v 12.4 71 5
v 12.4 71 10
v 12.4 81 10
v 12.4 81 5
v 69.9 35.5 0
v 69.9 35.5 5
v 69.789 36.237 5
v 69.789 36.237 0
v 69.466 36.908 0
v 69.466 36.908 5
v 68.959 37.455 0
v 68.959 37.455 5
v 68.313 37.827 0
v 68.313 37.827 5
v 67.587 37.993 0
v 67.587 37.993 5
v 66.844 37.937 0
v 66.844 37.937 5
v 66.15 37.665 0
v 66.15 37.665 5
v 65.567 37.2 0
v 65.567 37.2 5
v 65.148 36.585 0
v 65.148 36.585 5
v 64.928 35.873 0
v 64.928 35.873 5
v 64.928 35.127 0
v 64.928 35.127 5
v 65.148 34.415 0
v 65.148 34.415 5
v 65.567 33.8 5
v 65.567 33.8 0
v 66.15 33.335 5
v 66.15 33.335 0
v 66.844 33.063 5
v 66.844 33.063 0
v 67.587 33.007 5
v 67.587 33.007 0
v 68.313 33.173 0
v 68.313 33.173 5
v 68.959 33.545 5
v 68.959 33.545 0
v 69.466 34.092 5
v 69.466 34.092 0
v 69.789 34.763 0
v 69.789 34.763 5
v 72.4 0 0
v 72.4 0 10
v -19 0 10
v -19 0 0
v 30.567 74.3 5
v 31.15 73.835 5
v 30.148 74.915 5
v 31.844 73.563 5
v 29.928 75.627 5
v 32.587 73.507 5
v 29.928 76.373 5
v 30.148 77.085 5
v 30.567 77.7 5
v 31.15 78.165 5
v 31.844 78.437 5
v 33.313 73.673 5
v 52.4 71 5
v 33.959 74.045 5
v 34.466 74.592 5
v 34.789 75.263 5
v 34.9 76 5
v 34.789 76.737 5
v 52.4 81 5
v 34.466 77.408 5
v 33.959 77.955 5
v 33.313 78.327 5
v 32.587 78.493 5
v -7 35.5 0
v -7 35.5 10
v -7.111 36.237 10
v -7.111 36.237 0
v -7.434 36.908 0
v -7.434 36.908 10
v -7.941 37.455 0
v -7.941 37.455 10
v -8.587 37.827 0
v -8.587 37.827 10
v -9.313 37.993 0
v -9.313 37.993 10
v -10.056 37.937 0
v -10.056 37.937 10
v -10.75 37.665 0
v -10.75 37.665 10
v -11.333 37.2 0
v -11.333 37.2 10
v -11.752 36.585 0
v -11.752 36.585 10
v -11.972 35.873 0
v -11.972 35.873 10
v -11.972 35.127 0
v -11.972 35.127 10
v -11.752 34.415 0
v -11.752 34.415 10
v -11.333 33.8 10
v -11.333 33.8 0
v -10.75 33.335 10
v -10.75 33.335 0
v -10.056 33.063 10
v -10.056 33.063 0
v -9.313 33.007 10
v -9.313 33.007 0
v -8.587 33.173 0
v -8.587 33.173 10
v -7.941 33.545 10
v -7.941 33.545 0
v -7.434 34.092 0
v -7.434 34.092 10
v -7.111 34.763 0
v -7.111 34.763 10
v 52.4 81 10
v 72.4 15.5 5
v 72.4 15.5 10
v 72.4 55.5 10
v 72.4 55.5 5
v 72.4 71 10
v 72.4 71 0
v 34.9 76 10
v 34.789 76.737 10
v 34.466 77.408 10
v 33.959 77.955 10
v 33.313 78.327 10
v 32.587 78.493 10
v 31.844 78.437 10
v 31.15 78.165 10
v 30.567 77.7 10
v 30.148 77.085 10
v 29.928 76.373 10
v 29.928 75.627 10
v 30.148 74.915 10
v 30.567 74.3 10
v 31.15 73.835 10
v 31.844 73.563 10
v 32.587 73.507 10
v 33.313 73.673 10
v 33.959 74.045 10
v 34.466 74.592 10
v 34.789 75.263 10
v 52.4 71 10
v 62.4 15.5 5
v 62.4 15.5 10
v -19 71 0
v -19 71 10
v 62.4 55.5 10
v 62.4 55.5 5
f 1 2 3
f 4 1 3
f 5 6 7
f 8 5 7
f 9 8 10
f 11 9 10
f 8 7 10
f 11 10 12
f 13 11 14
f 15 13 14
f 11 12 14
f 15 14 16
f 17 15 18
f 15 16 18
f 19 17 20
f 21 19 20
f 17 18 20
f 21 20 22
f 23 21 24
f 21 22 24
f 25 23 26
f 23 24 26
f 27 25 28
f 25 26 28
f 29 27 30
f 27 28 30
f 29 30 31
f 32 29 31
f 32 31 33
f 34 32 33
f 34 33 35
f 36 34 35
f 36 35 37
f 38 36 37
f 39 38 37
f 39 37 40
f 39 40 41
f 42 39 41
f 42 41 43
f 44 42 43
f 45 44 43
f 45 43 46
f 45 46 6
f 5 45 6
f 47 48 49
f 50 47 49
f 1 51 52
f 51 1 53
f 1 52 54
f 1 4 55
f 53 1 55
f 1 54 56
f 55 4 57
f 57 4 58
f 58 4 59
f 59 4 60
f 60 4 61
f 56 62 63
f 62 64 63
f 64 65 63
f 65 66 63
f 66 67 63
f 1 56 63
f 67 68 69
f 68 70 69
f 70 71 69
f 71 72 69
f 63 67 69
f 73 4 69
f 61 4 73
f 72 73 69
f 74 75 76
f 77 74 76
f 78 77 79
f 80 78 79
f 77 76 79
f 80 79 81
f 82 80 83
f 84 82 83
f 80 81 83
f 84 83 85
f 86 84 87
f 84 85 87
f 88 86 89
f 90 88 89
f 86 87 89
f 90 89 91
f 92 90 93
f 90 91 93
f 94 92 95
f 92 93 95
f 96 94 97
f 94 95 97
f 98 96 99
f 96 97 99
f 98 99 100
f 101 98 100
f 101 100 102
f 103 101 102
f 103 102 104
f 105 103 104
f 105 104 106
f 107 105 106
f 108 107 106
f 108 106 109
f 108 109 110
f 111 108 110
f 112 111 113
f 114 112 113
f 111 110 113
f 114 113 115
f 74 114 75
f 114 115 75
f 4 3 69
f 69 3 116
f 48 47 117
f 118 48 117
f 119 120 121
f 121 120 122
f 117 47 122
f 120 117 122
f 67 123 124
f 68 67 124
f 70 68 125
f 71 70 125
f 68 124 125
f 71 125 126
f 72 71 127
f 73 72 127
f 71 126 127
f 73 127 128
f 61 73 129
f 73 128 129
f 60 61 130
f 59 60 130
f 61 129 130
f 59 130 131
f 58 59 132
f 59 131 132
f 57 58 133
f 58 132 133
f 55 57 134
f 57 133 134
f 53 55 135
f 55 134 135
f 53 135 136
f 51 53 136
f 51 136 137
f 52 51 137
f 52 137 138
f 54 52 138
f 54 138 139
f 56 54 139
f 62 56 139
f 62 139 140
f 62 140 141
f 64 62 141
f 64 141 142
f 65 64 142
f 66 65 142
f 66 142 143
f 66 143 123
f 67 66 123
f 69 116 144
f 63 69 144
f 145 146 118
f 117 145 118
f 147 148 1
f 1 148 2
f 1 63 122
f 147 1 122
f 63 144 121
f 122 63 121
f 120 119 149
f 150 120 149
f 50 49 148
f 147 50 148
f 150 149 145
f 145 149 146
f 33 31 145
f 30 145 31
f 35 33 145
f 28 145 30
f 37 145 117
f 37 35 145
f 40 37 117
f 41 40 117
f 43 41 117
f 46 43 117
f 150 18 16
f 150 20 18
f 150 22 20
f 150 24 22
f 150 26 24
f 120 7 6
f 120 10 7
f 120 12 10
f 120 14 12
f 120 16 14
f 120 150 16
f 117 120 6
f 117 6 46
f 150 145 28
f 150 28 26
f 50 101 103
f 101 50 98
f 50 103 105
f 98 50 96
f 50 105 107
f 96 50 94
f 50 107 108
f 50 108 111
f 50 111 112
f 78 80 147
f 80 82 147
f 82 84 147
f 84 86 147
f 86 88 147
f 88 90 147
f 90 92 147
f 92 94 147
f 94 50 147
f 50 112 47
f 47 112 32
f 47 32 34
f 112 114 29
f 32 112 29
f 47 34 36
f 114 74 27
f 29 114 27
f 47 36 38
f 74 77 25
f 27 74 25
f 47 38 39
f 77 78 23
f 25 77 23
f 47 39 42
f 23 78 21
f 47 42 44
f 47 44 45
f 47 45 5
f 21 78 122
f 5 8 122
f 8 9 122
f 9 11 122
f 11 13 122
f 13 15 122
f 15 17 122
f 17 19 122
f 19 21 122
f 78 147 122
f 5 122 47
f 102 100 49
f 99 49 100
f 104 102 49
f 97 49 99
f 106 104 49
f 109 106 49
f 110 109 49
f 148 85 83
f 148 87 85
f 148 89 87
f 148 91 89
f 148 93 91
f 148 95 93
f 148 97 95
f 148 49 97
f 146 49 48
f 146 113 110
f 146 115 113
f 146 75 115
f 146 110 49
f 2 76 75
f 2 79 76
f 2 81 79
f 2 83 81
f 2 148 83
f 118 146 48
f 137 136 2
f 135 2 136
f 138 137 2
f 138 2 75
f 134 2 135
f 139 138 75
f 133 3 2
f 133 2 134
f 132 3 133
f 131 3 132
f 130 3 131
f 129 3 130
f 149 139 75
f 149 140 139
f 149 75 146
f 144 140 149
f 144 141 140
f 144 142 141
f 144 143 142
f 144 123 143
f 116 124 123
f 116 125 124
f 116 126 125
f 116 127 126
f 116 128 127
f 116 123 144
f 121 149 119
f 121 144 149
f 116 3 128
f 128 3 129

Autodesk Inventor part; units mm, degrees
ref_plane "YZ Plane" through (0, 0, 0) normal (1, 0, 0) x (0, 1, 0)
ref_plane "XZ Plane" through (0, 0, 0) normal (0, 1, 0) x (-1, 0, 0)
ref_plane "XY Plane" through (0, 0, 0) normal (0, 0, 1) x (1, 0, 0)
sketch "Sketch1" plane through (0, 0, 0) normal (0, 0, 1) x (1, 0, 0)
  line L0 (0, 0) -> (72.4, 0)
  line L1 (72.4, 0) -> (72.4, 71)
  line L2 (72.4, 71) -> (0, 71)
  line L3 (0, 71) -> (0, 0)
  dimension "d0" = 72.4
  dimension "d1" = 71
extrude "Extrusion1" add sketch "Sketch1" along normal blind 10
sketch "Sketch2" plane through (0, 0, 10) normal (0, 0, 1) x (1, 0, 0)
  line L0 (72.4, 71) -> (0, 71) projected
  line L1 (52.4, 71) -> (12.4, 71)
  line L2 (12.4, 71) -> (12.4, 81)
  line L3 (12.4, 81) -> (52.4, 81)
  line L4 (52.4, 81) -> (52.4, 71)
  circle A0 centre (32.4, 76) radius 2.5
  line L5 (72.4, 0) -> (72.4, 71) projected
  point P0 (0, 0)
  point P1 (52.4, 76)
  point P2 (32.4, 81)
  dimension "d4" = 40
  dimension "d5" = 10
  dimension "d6" = 5
  dimension "d7" = 20
extrude "Extrusion2" add sketch "Sketch2" against normal blind 5
sketch "Sketch3" plane through (0, 0, 10) normal (0, 0, 1) x (1, 0, 0)
  line L0 (0, 71) -> (0, 0) projected
  line L1 (0, 0) -> (-19, 0)
  line L2 (-19, 0) -> (-19, 71)
  line L3 (-19, 71) -> (0, 71)
  line L4 (0, 71) -> (0, 0)
  line L5 (12.4, 71) -> (0, 71) projected
  circle A0 centre (-9.5, 35.5) radius 2.5
  point P0 (-19, 35.5)
  point P1 (-9.5, 71)
  dimension "d10" = 19
  dimension "d13" = 5
extrude "Extrusion3" add sketch "Sketch3" against normal blind 10
sketch "Sketch4" plane through (0, 0, 10) normal (0, 0, 1) x (1, 0, 0)
  line L0 (-19, 0) -> (72.4, 0) projected
  line L1 (52.4, 0) -> (12.4, 0)
  line L2 (12.4, 0) -> (12.4, 10)
  line L3 (12.4, 10) -> (52.4, 10)
  line L4 (52.4, 10) -> (52.4, 0)
  line L5 (72.4, 0) -> (72.4, 71) projected
  line L6 (72.4, 55.5) -> (62.4, 55.5)
  line L7 (62.4, 55.5) -> (62.4, 15.5)
  line L8 (62.4, 15.5) -> (72.4, 15.5)
  line L9 (72.4, 15.5) -> (72.4, 55.5)
  point P0 (0, 0)
  point P1 (72.4, 35.5)
  point P2 (72.4, 35.5)
  point P3 (52.4, 81)
  dimension "d16" = 40
  dimension "d17" = 10
  dimension "d18" = 10
  dimension "d19" = 40
extrude "Extrusion4" cut sketch "Sketch4" against normal blind 5 contours L8 L7 L6 L5
sketch "Sketch5" plane through (0, 0, 5) normal (0, 0, 1) x (1, 0, 0)
  line L0 (62.4, 55.5) -> (72.4, 55.5) construction
  line L1 (62.4, 15.5) -> (62.4, 55.5) construction
  line L2 (72.4, 15.5) -> (62.4, 15.5) construction
  line L3 (72.4, 55.5) -> (72.4, 15.5) construction
  line L4 (52.4, 10) -> (52.4, 0) construction
  line L5 (12.4, 10) -> (52.4, 10) construction
  line L6 (12.4, 0) -> (12.4, 10) construction
  line L7 (52.4, 0) -> (12.4, 0) construction
  circle A0 centre (32.4, 5) radius 2.5
  circle A1 centre (67.4, 35.5) radius 2.5
  point P0 (0, 0)
  point P1 (62.4, 35.5)
  point P2 (12.4, 5)
  point P3 (67.4, 55.5)
  point P4 (32.4, 10)
  dimension "d22" = 5
  dimension "d23" = 5
extrude "Extrusion5" cut sketch "Sketch5" against normal through all contours A1
properties part number "SP005" material "ABS Plastic"
